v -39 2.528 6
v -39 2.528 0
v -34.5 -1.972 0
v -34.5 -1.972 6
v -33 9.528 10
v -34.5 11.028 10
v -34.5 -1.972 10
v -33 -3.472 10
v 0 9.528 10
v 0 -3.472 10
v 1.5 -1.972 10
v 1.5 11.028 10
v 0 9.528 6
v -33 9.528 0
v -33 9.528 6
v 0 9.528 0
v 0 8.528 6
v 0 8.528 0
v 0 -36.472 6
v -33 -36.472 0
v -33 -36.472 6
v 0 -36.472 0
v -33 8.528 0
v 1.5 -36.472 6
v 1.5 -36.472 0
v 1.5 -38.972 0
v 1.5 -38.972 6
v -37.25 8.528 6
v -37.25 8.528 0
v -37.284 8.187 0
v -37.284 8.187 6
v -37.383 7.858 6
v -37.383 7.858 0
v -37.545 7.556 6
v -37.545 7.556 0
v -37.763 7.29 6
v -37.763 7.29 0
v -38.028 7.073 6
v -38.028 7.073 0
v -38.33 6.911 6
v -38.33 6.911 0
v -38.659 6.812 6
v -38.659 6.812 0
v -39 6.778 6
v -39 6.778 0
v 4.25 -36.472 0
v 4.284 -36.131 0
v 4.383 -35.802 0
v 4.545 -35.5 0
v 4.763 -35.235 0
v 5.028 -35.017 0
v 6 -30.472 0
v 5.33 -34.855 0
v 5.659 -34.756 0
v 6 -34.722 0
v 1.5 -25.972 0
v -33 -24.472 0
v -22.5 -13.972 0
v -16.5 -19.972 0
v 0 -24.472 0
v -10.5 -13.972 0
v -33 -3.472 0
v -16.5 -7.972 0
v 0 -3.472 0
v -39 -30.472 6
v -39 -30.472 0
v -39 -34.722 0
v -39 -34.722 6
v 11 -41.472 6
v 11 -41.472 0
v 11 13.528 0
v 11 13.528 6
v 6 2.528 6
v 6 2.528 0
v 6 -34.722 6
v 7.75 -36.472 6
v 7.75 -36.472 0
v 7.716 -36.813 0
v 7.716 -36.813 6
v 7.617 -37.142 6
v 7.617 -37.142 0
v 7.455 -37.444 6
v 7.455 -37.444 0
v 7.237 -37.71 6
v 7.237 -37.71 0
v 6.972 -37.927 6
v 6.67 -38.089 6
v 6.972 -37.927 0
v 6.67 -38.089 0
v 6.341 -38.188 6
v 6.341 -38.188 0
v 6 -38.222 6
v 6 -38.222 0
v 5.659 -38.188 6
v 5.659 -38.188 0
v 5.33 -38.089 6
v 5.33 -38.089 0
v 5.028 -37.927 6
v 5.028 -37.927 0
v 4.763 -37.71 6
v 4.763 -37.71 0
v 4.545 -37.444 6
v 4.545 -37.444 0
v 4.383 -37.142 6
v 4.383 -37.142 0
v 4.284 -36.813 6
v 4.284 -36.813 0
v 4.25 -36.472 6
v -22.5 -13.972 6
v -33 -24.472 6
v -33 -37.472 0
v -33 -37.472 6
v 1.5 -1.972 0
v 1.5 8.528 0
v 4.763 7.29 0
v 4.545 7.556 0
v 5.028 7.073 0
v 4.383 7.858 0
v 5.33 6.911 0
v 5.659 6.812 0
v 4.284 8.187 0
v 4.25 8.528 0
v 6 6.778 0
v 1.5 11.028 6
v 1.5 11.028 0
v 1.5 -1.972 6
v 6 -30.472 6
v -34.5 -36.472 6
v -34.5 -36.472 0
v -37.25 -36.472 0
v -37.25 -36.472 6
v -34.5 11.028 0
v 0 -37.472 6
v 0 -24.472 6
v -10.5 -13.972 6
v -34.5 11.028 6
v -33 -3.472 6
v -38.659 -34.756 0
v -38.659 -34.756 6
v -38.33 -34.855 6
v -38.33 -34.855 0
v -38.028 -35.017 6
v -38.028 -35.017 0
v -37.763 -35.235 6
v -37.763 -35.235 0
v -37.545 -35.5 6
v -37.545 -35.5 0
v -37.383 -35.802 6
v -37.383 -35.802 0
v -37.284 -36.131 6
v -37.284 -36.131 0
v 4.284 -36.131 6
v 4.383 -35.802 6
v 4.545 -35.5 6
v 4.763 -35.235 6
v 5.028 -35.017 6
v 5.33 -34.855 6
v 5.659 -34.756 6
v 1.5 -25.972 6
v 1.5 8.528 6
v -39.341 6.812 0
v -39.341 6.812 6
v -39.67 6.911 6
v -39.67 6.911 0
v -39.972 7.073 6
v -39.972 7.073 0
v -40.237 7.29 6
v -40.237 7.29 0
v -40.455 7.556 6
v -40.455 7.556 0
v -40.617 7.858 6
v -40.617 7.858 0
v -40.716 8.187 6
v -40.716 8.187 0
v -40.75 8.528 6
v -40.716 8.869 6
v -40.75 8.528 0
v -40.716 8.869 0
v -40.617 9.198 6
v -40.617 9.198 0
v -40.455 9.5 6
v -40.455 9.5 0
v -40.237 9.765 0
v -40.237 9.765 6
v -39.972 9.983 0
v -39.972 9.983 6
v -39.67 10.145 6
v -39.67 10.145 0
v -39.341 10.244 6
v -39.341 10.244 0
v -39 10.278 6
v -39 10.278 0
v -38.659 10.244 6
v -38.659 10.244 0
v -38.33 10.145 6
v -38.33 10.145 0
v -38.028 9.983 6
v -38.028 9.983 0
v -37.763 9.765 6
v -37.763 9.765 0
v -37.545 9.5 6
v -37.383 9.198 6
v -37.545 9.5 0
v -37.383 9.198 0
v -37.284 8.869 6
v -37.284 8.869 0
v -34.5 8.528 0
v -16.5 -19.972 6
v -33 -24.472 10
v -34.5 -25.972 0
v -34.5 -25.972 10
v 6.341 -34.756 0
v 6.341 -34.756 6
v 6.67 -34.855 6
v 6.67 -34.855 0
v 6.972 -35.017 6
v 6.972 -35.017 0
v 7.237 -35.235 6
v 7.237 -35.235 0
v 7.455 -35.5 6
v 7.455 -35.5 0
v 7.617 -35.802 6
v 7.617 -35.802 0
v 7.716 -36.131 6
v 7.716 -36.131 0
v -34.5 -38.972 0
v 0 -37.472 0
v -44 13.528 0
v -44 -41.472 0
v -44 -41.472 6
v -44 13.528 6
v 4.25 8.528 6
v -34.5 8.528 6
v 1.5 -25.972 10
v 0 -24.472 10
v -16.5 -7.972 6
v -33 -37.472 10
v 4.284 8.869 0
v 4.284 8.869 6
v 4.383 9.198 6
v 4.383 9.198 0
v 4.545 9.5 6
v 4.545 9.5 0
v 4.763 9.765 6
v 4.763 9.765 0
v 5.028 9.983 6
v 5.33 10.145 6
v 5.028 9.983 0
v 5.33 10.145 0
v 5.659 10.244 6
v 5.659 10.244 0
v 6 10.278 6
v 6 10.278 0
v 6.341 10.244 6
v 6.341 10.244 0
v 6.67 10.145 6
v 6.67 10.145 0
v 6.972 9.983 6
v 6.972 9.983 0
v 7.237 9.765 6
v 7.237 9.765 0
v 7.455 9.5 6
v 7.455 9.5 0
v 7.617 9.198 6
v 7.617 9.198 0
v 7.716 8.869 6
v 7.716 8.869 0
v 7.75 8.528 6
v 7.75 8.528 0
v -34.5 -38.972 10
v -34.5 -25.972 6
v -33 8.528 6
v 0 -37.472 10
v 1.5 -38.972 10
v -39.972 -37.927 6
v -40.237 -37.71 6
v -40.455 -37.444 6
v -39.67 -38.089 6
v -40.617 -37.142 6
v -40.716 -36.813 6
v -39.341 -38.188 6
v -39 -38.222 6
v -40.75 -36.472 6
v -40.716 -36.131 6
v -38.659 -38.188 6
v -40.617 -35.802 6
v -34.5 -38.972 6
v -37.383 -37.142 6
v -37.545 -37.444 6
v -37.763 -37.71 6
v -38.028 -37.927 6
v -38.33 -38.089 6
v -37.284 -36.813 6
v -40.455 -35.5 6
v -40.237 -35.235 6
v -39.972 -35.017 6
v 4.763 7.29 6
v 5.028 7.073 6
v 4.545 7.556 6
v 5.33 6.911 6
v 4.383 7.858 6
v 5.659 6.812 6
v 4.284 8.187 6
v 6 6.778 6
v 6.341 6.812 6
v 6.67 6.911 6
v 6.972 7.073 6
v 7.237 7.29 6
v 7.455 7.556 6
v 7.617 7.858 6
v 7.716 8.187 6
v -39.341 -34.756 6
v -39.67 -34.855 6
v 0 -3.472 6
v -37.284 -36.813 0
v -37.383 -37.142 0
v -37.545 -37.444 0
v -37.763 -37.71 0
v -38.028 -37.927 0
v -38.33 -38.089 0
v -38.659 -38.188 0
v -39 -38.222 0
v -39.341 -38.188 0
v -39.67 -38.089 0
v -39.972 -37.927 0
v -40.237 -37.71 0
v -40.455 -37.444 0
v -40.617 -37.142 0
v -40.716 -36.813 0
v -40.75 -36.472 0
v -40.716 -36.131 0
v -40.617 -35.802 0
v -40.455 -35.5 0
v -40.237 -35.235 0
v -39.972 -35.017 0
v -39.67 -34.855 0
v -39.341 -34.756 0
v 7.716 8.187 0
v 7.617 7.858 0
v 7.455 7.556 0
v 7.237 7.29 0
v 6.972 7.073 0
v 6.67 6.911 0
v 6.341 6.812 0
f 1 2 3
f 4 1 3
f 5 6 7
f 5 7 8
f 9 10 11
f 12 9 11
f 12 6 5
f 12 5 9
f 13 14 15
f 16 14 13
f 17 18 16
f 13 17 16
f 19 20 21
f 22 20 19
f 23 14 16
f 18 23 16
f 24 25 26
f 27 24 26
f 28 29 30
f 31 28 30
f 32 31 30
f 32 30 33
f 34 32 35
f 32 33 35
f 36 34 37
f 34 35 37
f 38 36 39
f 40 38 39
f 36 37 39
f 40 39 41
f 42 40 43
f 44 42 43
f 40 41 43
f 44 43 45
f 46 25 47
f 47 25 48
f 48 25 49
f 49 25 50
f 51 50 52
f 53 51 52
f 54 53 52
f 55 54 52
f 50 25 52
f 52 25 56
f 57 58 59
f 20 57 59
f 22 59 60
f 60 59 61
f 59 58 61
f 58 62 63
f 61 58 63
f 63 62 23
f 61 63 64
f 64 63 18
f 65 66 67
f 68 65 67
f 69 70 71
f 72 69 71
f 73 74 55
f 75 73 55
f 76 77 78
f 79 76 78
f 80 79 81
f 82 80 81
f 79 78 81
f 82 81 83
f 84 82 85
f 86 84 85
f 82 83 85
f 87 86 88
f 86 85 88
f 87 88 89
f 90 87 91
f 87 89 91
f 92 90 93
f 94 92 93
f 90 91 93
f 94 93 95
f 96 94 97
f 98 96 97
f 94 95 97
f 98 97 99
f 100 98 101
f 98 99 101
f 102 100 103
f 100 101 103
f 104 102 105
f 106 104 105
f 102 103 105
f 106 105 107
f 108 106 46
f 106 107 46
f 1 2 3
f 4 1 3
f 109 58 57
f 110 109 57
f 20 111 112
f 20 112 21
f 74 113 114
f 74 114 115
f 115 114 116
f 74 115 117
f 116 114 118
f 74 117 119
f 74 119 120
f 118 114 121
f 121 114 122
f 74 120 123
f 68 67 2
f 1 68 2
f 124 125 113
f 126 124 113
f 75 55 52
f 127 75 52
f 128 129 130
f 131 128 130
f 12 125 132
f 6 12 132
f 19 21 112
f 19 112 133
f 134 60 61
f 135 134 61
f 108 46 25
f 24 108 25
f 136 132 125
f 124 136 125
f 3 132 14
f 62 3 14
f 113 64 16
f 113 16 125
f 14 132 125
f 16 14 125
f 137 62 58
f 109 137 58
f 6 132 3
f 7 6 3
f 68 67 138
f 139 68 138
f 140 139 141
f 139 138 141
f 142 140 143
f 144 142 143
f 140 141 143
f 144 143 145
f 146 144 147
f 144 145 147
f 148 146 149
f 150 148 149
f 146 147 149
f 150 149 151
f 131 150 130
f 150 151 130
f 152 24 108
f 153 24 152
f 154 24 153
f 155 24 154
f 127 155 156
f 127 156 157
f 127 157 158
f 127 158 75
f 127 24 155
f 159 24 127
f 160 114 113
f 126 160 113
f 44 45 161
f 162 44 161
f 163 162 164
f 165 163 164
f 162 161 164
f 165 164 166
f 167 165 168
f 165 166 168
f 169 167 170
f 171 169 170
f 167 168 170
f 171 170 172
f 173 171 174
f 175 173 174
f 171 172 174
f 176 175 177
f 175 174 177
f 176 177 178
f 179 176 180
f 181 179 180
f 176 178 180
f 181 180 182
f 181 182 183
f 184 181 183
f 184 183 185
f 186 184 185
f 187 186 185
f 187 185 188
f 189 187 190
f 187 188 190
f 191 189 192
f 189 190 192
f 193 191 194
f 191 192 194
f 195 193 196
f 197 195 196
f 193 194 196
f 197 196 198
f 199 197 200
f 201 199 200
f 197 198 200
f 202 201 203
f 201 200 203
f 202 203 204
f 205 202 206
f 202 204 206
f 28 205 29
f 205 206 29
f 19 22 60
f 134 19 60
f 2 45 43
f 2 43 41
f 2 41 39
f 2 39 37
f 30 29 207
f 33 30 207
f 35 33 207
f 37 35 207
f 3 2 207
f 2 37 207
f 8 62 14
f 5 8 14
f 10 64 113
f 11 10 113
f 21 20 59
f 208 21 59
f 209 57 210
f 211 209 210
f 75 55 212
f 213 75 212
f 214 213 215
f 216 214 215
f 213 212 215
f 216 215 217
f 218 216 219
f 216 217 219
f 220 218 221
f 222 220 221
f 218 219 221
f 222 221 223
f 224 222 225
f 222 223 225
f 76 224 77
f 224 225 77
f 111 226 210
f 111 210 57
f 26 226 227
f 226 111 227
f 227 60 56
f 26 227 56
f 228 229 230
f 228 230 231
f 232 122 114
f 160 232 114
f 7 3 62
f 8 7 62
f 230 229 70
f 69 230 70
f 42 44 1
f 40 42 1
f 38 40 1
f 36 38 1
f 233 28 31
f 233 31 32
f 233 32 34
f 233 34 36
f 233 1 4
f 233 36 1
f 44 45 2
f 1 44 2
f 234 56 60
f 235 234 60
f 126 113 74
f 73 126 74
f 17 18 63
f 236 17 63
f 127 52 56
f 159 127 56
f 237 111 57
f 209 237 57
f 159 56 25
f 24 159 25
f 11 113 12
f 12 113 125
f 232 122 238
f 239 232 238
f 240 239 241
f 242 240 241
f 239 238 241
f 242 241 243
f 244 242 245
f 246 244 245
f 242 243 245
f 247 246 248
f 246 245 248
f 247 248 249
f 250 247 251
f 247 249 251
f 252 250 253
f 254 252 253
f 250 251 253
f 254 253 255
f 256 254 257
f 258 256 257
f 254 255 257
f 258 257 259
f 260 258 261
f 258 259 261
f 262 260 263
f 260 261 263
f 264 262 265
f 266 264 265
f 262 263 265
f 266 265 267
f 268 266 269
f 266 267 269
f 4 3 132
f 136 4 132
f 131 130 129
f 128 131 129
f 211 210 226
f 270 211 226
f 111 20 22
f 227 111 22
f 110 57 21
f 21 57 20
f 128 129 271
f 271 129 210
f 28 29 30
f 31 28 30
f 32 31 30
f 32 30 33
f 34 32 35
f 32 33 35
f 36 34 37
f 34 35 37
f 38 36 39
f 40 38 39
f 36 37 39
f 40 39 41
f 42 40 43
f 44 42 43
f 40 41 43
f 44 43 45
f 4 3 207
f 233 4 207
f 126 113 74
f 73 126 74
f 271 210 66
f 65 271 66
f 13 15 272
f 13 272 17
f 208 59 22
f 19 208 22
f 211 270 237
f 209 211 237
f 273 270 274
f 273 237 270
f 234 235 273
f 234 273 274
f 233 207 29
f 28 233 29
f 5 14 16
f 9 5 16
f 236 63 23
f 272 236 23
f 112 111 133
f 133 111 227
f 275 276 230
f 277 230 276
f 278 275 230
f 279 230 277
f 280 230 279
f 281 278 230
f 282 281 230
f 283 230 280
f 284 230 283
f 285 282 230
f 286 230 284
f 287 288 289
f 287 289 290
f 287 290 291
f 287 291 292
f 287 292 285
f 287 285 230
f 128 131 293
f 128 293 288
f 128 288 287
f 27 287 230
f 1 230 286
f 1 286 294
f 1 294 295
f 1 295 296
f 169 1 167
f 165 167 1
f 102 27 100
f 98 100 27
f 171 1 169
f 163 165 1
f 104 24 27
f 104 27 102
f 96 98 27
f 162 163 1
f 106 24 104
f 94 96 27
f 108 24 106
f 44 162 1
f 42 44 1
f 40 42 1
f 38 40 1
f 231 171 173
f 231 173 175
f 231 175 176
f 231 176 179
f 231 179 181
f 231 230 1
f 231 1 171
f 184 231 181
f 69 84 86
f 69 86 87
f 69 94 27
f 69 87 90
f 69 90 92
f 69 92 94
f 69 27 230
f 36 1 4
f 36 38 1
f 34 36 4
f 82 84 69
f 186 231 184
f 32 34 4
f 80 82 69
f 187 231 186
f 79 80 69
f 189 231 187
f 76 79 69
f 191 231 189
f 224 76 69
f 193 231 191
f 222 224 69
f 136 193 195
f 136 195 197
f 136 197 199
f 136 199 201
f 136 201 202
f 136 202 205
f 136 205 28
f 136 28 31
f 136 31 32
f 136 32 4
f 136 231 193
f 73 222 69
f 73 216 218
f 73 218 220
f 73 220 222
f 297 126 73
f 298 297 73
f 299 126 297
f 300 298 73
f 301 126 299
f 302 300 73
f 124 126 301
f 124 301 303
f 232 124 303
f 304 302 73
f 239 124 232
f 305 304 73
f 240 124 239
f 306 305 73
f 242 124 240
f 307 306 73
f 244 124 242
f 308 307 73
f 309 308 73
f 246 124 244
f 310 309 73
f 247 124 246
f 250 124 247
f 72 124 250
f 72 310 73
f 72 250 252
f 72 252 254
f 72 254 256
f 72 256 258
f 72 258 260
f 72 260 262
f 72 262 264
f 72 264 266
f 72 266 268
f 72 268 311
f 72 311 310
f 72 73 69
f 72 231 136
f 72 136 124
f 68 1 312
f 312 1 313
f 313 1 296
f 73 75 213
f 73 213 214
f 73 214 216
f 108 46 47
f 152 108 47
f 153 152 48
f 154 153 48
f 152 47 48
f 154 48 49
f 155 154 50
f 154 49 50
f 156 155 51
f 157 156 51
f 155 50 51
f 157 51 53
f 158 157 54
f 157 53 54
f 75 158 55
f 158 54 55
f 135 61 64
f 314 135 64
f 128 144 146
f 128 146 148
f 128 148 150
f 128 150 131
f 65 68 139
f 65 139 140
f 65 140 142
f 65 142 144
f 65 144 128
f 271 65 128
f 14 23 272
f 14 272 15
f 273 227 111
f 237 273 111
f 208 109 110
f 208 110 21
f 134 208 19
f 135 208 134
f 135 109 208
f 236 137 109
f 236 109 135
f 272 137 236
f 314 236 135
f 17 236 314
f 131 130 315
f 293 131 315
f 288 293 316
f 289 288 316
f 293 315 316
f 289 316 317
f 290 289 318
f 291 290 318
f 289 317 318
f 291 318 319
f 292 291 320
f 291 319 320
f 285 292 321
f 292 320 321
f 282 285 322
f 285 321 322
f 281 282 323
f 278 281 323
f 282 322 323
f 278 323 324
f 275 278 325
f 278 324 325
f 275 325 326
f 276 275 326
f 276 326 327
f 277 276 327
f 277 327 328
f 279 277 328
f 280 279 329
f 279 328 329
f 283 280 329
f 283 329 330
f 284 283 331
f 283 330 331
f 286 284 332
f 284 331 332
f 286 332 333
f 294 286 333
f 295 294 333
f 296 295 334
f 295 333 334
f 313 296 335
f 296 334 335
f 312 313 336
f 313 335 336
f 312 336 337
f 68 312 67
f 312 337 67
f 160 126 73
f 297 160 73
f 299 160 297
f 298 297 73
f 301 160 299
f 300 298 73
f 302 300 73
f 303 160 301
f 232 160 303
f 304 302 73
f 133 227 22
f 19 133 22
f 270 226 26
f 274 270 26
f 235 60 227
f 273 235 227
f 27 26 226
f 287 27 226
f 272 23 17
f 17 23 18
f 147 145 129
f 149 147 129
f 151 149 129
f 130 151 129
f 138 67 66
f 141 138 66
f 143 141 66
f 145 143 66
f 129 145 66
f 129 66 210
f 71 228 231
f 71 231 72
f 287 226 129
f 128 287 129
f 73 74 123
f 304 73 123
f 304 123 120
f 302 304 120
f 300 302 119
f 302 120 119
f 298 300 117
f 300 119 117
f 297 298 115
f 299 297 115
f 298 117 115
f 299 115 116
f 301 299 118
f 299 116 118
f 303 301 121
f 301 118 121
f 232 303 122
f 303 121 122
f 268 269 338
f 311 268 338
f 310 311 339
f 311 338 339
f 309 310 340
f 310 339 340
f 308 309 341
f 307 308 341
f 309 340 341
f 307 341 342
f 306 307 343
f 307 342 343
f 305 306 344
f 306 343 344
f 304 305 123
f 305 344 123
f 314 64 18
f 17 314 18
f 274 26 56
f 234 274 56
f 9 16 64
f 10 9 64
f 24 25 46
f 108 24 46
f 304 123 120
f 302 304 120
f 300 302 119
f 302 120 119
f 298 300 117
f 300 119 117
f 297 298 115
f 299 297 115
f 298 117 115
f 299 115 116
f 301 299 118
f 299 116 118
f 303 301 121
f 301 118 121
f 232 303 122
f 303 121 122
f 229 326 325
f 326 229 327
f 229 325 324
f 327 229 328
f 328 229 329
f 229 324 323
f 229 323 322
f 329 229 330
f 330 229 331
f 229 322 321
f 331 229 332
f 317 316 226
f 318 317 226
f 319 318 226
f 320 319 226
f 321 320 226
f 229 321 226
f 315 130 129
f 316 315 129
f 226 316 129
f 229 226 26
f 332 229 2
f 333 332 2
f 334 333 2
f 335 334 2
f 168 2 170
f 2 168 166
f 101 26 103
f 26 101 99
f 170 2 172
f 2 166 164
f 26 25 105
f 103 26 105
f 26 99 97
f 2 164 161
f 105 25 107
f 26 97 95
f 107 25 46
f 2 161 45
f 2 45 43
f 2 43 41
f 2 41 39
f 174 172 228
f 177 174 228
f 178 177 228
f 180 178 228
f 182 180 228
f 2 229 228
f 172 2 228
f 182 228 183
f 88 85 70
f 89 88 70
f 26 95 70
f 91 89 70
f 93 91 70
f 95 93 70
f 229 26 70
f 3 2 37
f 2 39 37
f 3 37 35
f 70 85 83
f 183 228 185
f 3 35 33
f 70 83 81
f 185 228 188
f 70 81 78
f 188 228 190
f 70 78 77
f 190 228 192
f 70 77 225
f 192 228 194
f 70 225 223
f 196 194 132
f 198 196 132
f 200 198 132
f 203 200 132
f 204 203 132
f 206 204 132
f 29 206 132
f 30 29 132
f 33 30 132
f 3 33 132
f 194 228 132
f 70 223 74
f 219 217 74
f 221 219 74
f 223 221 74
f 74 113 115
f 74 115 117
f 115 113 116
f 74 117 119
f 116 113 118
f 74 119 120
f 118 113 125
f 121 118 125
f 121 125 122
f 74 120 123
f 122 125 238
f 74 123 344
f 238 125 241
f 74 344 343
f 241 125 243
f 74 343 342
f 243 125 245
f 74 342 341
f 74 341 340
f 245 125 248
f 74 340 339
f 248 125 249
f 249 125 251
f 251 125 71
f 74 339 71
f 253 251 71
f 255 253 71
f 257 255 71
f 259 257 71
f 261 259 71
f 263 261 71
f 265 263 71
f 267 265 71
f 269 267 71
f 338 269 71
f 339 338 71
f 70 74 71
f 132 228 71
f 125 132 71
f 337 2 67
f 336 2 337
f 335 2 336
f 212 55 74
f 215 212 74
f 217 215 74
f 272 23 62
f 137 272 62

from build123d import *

# Parameters (mm, degrees)
F0_W     = 55
F0_H     = 55
F1_DEPTH = 6
F0_W_2   = 33
F0_H_2   = 1
F2_DEPTH = 10
F3_DEPTH = 6


with BuildPart() as f1:
    # F0 (on Top) → F1 (new body)
    with BuildSketch(Plane.XY):
        with Locations((-16.5, -13.9720915013)):
            Rectangle(F0_W, F0_H)
        with BuildLine():
            ThreePointArc((-39, 6.7779084987), (-40.2374368671, 9.7653453658), (-37.25, 8.5279084987))
            Line((-37.25, 8.5279084987), (-34.5, 8.5279084987))
            Line((-34.5, 8.5279084987), (-34.5, 11.0279084987))
            Line((-34.5, 11.0279084987), (1.5, 11.0279084987))
            Line((1.5, 11.0279084987), (1.5, 8.5279084987))
            Line((1.5, 8.5279084987), (4.25, 8.5279084987))
            ThreePointArc((4.25, 8.5279084987), (6, 10.2779084987), (7.75, 8.5279084987))
            ThreePointArc((7.75, 8.5279084987), (7.2374368671, 7.2904716317), (6, 6.7779084987))
            Line((6, 6.7779084987), (6, 2.5279084987))
            Line((6, 2.5279084987), (6, -30.4720915013))
            Line((6, -30.4720915013), (6, -34.7220915013))
            ThreePointArc((6, -34.7220915013), (7.2374368671, -35.2346546342), (7.75, -36.4720915013))
            ThreePointArc((7.75, -36.4720915013), (6, -38.2220915013), (4.25, -36.4720915013))
            Line((4.25, -36.4720915013), (1.5, -36.4720915013))
            Line((1.5, -36.4720915013), (1.5, -38.9720915013))
            Line((1.5, -38.9720915013), (-34.5, -38.9720915013))
            Line((-34.5, -38.9720915013), (-34.5, -36.4720915013))
            Line((-34.5, -36.4720915013), (-37.25, -36.4720915013))
            ThreePointArc((-37.25, -36.4720915013), (-40.2374368671, -37.7095283683), (-39, -34.7220915013))
            Line((-39, -34.7220915013), (-39, -30.4720915013))
            Line((-39, -30.4720915013), (-39, 2.5279084987))
            Line((-39, 2.5279084987), (-39, 6.7779084987))
        make_face(mode=Mode.SUBTRACT)
        with BuildLine():
            Line((-34.5, 8.5279084987), (-37.25, 8.5279084987))
            ThreePointArc((-37.25, 8.5279084987), (-37.7625631329, 7.2904716317), (-39, 6.7779084987))
            Line((-39, 6.7779084987), (-39, 2.5279084987))
            Line((-39, 2.5279084987), (-34.5, -1.9720915013))
            Line((-34.5, -1.9720915013), (-34.5, 8.5279084987))
        make_face()
        with BuildLine():
            Line((4.25, 8.5279084987), (1.5, 8.5279084987))
            Line((1.5, 8.5279084987), (1.5, -1.9720915013))
            Line((1.5, -1.9720915013), (6, 2.5279084987))
            Line((6, 2.5279084987), (6, 6.7779084987))
            ThreePointArc((6, 6.7779084987), (4.7625631329, 7.2904716317), (4.25, 8.5279084987))
        make_face()
    extrude(amount=F1_DEPTH)


with BuildPart() as f1b:
    # F0 (on Top) → F1, piece 2 (new body)
    with BuildSketch(Plane.XY):
        with Locations((-16.5, 9.0279084987)):
            Rectangle(F0_W_2, F0_H_2)
    extrude(amount=F1_DEPTH)


with BuildPart() as f1c:
    # F0 (on Top) → F1, piece 3 (new body)
    with BuildSketch(Plane.XY):
        with Locations((-16.5, -36.9720915013)):
            Rectangle(F0_W_2, F0_H_2)
    extrude(amount=F1_DEPTH)


with BuildPart() as f2:
    # F0 (on Top) → F2 (new body)
    with BuildSketch(Plane.XY):
        Polygon((-34.5, 11.0279084987), (-34.5, 8.5279084987), (-33, 8.5279084987), (-33, 9.5279084987), (0, 9.5279084987), (0, 8.5279084987), (1.5, 8.5279084987), (1.5, 11.0279084987), align=None)
        Polygon((1.5, 8.5279084987), (0, 8.5279084987), (0, -3.4720915013), (1.5, -1.9720915013), align=None)
        Polygon((-33, 8.5279084987), (-34.5, 8.5279084987), (-34.5, -1.9720915013), (-33, -3.4720915013), align=None)
    extrude(amount=F2_DEPTH)


with BuildPart() as f2b:
    # F0 (on Top) → F2, piece 2 (new body)
    with BuildSketch(Plane.XY):
        Polygon((-33, -36.4720915013), (-34.5, -36.4720915013), (-34.5, -38.9720915013), (1.5, -38.9720915013), (1.5, -36.4720915013), (0, -36.4720915013), (0, -37.4720915013), (-33, -37.4720915013), align=None)
        Polygon((-33, -24.4720915013), (-34.5, -25.9720915013), (-34.5, -36.4720915013), (-33, -36.4720915013), align=None)
        Polygon((1.5, -25.9720915013), (0, -24.4720915013), (0, -36.4720915013), (1.5, -36.4720915013), align=None)
    extrude(amount=F2_DEPTH)


with BuildPart() as f3:
    # F0 (on Top) → F3 (new body)
    with BuildSketch(Plane.XY):
        Polygon((-16.5, -7.9720915013), (-33, 8.5279084987), (-33, -3.4720915013), (-22.5, -13.9720915013), align=None)
        Polygon((0, -24.4720915013), (-10.5, -13.9720915013), (-16.5, -19.9720915013), (0, -36.4720915013), align=None)
        Polygon((-22.5, -13.9720915013), (-33, -24.4720915013), (-33, -36.4720915013), (-16.5, -19.9720915013), align=None)
        Polygon((0, -3.4720915013), (0, 8.5279084987), (-16.5, -7.9720915013), (-10.5, -13.9720915013), align=None)
        Polygon((-10.5, -13.9720915013), (-16.5, -7.9720915013), (-22.5, -13.9720915013), (-16.5, -19.9720915013), align=None)
    extrude(amount=F3_DEPTH)


with BuildPart() as f3b:
    # F0 (on Top) → F3, piece 2 (new body)
    with BuildSketch(Plane.XY):
        with BuildLine():
            Line((6, -30.4720915013), (1.5, -25.9720915013))
            Line((1.5, -25.9720915013), (1.5, -36.4720915013))
            Line((1.5, -36.4720915013), (4.25, -36.4720915013))
            ThreePointArc((4.25, -36.4720915013), (4.7625631329, -35.2346546342), (6, -34.7220915013))
            Line((6, -34.7220915013), (6, -30.4720915013))
        make_face()
    extrude(amount=F3_DEPTH)


with BuildPart() as f3c:
    # F0 (on Top) → F3, piece 3 (new body)
    with BuildSketch(Plane.XY):
        with BuildLine():
            Line((4.25, 8.5279084987), (1.5, 8.5279084987))
            Line((1.5, 8.5279084987), (1.5, -1.9720915013))
            Line((1.5, -1.9720915013), (6, 2.5279084987))
            Line((6, 2.5279084987), (6, 6.7779084987))
            ThreePointArc((6, 6.7779084987), (4.7625631329, 7.2904716317), (4.25, 8.5279084987))
        make_face()
    extrude(amount=F3_DEPTH)


with BuildPart() as f3d:
    # F0 (on Top) → F3, piece 4 (new body)
    with BuildSketch(Plane.XY):
        with BuildLine():
            Line((-34.5, 8.5279084987), (-37.25, 8.5279084987))
            ThreePointArc((-37.25, 8.5279084987), (-37.7625631329, 7.2904716317), (-39, 6.7779084987))
            Line((-39, 6.7779084987), (-39, 2.5279084987))
            Line((-39, 2.5279084987), (-34.5, -1.9720915013))
            Line((-34.5, -1.9720915013), (-34.5, 8.5279084987))
        make_face()
    extrude(amount=F3_DEPTH)


with BuildPart() as f3e:
    # F0 (on Top) → F3, piece 5 (new body)
    with BuildSketch(Plane.XY):
        with BuildLine():
            Line((-34.5, -25.9720915013), (-39, -30.4720915013))
            Line((-39, -30.4720915013), (-39, -34.7220915013))
            ThreePointArc((-39, -34.7220915013), (-37.7625631329, -35.2346546342), (-37.25, -36.4720915013))
            Line((-37.25, -36.4720915013), (-34.5, -36.4720915013))
            Line((-34.5, -36.4720915013), (-34.5, -25.9720915013))
        make_face()
    extrude(amount=F3_DEPTH)


solid = Compound([f1.part, f1b.part, f1c.part, f2.part, f2b.part, f3.part, f3b.part, f3c.part, f3d.part, f3e.part])
